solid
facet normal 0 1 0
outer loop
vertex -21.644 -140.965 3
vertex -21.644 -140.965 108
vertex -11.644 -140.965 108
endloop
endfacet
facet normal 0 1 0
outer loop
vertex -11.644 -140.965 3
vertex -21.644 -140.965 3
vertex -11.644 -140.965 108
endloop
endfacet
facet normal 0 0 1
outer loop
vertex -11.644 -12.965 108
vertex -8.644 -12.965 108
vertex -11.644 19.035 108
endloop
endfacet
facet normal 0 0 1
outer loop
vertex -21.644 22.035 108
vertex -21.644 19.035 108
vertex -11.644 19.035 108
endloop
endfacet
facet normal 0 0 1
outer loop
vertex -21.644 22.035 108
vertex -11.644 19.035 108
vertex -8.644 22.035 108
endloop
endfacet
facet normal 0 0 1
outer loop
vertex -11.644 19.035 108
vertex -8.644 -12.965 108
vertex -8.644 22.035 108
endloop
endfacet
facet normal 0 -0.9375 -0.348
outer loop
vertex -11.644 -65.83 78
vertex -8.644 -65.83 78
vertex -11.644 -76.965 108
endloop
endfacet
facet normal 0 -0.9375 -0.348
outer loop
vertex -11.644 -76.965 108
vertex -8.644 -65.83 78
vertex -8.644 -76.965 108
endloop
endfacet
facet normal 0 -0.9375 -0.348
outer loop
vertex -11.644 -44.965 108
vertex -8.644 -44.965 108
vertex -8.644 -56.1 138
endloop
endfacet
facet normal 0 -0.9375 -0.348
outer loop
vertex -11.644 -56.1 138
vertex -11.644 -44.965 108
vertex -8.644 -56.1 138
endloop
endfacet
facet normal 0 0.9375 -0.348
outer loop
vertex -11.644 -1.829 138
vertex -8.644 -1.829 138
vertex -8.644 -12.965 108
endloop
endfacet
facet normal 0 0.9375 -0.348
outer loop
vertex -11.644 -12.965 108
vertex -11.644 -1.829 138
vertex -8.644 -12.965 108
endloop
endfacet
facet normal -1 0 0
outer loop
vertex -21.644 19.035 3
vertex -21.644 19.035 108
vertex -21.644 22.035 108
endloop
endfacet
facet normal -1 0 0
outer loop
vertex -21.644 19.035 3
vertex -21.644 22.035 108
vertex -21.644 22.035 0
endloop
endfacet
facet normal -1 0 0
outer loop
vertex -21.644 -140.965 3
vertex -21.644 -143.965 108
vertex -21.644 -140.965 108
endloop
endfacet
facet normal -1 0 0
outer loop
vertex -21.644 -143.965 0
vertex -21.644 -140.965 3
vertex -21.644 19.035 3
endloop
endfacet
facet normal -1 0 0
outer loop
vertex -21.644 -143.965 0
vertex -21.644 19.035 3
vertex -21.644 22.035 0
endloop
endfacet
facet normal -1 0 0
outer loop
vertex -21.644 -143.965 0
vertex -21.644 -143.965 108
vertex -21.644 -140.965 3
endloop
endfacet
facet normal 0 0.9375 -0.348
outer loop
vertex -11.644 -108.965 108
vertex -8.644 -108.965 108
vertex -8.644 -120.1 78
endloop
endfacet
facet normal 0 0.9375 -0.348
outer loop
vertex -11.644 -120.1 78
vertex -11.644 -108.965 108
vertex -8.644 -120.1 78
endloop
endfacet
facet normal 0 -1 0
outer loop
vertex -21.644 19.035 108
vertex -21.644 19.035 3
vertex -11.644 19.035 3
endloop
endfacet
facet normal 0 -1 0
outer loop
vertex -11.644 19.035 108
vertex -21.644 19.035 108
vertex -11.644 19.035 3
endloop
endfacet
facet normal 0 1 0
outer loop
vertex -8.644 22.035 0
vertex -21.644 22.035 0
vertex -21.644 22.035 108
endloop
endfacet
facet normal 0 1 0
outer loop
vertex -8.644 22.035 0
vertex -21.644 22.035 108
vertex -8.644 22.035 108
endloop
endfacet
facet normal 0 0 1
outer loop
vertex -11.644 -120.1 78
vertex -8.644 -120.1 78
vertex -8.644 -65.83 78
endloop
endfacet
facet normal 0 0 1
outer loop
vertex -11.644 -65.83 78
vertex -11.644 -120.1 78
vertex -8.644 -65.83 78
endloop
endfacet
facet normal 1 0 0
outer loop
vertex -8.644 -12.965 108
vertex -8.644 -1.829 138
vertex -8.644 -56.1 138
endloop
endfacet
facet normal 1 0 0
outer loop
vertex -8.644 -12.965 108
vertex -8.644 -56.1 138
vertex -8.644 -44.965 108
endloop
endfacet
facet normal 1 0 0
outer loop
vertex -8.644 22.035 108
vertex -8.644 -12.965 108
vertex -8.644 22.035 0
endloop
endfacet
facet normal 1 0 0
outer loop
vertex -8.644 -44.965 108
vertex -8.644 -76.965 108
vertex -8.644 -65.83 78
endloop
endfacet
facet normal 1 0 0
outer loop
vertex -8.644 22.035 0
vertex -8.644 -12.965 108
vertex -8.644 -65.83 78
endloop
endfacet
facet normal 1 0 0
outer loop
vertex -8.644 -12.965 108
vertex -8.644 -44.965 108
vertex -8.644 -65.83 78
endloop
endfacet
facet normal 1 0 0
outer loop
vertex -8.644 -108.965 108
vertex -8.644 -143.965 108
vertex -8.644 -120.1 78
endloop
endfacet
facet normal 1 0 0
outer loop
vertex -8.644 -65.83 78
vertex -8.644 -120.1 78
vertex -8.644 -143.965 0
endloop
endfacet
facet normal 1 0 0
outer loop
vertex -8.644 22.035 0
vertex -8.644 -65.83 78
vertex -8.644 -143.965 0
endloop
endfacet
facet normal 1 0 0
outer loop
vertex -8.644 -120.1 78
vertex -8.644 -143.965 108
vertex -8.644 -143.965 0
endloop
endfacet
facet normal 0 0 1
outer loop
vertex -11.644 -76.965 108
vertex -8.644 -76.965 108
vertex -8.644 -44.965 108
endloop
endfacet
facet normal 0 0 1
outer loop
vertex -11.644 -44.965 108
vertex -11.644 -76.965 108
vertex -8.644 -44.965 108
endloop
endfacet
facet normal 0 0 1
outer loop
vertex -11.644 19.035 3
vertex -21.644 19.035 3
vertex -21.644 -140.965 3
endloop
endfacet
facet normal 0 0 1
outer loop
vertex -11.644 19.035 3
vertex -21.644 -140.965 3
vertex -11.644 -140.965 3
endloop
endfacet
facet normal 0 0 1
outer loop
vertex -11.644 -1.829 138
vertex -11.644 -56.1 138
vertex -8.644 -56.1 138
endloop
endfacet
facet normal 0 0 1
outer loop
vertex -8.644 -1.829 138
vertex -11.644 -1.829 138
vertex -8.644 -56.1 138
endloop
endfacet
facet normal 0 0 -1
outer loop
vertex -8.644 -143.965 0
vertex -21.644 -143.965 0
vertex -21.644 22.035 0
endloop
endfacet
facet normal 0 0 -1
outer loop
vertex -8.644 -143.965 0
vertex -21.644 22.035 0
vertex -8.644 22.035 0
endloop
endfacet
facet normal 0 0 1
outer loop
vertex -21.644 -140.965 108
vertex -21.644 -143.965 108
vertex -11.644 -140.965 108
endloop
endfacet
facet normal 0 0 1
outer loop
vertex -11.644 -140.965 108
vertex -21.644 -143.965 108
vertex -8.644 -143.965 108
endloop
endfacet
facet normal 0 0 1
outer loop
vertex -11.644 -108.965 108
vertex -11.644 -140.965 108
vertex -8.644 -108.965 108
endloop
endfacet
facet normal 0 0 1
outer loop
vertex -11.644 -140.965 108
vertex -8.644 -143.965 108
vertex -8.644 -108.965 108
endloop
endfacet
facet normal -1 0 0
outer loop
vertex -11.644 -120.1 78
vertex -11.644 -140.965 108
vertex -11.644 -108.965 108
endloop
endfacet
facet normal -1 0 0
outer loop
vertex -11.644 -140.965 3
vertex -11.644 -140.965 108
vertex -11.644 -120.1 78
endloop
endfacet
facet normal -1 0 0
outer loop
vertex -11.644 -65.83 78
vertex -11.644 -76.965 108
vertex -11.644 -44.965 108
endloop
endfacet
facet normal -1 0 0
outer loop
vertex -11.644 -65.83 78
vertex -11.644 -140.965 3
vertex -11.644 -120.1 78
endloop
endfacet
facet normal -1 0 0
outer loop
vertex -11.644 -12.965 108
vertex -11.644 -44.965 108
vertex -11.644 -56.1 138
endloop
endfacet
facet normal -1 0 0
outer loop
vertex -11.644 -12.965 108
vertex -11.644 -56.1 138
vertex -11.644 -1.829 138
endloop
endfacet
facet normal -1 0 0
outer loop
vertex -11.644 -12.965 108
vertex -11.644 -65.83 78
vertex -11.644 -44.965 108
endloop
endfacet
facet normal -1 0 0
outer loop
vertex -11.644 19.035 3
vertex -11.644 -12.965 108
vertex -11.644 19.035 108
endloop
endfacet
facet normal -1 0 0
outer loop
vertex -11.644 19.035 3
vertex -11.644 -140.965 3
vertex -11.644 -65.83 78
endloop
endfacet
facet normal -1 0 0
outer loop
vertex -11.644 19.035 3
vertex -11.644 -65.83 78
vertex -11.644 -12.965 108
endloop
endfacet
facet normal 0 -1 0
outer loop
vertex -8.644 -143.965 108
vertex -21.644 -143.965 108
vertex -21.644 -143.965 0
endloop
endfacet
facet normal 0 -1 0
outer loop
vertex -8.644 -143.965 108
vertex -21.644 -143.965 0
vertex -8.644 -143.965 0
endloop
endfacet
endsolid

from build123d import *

# Parameters (mm, degrees)
SKETCH_1_W          = 13
SKETCH_1_H          = 160
EXTRUDE_1_DEPTH     = 3
SKETCH_2_W          = 3
SKETCH_2_H          = 160
EXTRUDE_2_DEPTH     = 135
SKETCH_3_W          = 13
SKETCH_3_H          = 138
EXTRUDE_3_DEPTH     = 3
SKETCH_4_W          = 13
SKETCH_4_H          = 138
EXTRUDE_4_DEPTH     = 3
CUT_EXTRUDE_1_DEPTH = 14


with BuildPart() as part:
    # 草圖1 → 填料-伸長1 (new body)
    with BuildSketch(Plane.XY):
        with Locations((-15.144058005, -60.964912281)):
            Rectangle(SKETCH_1_W, SKETCH_1_H)
    extrude(amount=EXTRUDE_1_DEPTH)

    # 草圖2 → 填料-伸長2 (add)
    with BuildSketch(Plane.XY.offset(3)):
        with Locations((-10.144058005, -60.964912281)):
            Rectangle(SKETCH_2_W, SKETCH_2_H)
    extrude(amount=EXTRUDE_2_DEPTH)

    # 草圖3 → 填料-伸長3 (add)
    with BuildSketch(Plane.XZ.offset(140.964912281)):
        with Locations((-15.144058005, 69)):
            Rectangle(SKETCH_3_W, SKETCH_3_H)
    extrude(amount=EXTRUDE_3_DEPTH)

    # 草圖4 → 填料-伸長4 (add)
    with BuildSketch(Plane(origin=(0, 19.035087719, 0), x_dir=(1, 0, 0), z_dir=(0, 1, 0))):
        with Locations((-15.144058005, -69)):
            Rectangle(SKETCH_4_W, SKETCH_4_H)
    extrude(amount=EXTRUDE_4_DEPTH)

    # 草圖5 → 除料-伸長1 (cut, through all)
    with BuildSketch(Plane(origin=(-8.644058005, 0, 0), x_dir=(0, 0, -1), z_dir=(1, 0, 0))):
        Polygon((-108, -76.964912281), (-108, -44.964912281), (-138, -56.100441006), (-138, -143.964912281), (-108, -143.964912281), (-108, -108.964912281), (-77.999803751, -120.099912281), (-77.999803751, -65.829912281), align=None)
        Polygon((-138, 22.035087719), (-138, -1.829383555), (-108, -12.964912281), (-108, 22.035087719), align=None)
    extrude(amount=-CUT_EXTRUDE_1_DEPTH, mode=Mode.SUBTRACT)


solid = part.part
